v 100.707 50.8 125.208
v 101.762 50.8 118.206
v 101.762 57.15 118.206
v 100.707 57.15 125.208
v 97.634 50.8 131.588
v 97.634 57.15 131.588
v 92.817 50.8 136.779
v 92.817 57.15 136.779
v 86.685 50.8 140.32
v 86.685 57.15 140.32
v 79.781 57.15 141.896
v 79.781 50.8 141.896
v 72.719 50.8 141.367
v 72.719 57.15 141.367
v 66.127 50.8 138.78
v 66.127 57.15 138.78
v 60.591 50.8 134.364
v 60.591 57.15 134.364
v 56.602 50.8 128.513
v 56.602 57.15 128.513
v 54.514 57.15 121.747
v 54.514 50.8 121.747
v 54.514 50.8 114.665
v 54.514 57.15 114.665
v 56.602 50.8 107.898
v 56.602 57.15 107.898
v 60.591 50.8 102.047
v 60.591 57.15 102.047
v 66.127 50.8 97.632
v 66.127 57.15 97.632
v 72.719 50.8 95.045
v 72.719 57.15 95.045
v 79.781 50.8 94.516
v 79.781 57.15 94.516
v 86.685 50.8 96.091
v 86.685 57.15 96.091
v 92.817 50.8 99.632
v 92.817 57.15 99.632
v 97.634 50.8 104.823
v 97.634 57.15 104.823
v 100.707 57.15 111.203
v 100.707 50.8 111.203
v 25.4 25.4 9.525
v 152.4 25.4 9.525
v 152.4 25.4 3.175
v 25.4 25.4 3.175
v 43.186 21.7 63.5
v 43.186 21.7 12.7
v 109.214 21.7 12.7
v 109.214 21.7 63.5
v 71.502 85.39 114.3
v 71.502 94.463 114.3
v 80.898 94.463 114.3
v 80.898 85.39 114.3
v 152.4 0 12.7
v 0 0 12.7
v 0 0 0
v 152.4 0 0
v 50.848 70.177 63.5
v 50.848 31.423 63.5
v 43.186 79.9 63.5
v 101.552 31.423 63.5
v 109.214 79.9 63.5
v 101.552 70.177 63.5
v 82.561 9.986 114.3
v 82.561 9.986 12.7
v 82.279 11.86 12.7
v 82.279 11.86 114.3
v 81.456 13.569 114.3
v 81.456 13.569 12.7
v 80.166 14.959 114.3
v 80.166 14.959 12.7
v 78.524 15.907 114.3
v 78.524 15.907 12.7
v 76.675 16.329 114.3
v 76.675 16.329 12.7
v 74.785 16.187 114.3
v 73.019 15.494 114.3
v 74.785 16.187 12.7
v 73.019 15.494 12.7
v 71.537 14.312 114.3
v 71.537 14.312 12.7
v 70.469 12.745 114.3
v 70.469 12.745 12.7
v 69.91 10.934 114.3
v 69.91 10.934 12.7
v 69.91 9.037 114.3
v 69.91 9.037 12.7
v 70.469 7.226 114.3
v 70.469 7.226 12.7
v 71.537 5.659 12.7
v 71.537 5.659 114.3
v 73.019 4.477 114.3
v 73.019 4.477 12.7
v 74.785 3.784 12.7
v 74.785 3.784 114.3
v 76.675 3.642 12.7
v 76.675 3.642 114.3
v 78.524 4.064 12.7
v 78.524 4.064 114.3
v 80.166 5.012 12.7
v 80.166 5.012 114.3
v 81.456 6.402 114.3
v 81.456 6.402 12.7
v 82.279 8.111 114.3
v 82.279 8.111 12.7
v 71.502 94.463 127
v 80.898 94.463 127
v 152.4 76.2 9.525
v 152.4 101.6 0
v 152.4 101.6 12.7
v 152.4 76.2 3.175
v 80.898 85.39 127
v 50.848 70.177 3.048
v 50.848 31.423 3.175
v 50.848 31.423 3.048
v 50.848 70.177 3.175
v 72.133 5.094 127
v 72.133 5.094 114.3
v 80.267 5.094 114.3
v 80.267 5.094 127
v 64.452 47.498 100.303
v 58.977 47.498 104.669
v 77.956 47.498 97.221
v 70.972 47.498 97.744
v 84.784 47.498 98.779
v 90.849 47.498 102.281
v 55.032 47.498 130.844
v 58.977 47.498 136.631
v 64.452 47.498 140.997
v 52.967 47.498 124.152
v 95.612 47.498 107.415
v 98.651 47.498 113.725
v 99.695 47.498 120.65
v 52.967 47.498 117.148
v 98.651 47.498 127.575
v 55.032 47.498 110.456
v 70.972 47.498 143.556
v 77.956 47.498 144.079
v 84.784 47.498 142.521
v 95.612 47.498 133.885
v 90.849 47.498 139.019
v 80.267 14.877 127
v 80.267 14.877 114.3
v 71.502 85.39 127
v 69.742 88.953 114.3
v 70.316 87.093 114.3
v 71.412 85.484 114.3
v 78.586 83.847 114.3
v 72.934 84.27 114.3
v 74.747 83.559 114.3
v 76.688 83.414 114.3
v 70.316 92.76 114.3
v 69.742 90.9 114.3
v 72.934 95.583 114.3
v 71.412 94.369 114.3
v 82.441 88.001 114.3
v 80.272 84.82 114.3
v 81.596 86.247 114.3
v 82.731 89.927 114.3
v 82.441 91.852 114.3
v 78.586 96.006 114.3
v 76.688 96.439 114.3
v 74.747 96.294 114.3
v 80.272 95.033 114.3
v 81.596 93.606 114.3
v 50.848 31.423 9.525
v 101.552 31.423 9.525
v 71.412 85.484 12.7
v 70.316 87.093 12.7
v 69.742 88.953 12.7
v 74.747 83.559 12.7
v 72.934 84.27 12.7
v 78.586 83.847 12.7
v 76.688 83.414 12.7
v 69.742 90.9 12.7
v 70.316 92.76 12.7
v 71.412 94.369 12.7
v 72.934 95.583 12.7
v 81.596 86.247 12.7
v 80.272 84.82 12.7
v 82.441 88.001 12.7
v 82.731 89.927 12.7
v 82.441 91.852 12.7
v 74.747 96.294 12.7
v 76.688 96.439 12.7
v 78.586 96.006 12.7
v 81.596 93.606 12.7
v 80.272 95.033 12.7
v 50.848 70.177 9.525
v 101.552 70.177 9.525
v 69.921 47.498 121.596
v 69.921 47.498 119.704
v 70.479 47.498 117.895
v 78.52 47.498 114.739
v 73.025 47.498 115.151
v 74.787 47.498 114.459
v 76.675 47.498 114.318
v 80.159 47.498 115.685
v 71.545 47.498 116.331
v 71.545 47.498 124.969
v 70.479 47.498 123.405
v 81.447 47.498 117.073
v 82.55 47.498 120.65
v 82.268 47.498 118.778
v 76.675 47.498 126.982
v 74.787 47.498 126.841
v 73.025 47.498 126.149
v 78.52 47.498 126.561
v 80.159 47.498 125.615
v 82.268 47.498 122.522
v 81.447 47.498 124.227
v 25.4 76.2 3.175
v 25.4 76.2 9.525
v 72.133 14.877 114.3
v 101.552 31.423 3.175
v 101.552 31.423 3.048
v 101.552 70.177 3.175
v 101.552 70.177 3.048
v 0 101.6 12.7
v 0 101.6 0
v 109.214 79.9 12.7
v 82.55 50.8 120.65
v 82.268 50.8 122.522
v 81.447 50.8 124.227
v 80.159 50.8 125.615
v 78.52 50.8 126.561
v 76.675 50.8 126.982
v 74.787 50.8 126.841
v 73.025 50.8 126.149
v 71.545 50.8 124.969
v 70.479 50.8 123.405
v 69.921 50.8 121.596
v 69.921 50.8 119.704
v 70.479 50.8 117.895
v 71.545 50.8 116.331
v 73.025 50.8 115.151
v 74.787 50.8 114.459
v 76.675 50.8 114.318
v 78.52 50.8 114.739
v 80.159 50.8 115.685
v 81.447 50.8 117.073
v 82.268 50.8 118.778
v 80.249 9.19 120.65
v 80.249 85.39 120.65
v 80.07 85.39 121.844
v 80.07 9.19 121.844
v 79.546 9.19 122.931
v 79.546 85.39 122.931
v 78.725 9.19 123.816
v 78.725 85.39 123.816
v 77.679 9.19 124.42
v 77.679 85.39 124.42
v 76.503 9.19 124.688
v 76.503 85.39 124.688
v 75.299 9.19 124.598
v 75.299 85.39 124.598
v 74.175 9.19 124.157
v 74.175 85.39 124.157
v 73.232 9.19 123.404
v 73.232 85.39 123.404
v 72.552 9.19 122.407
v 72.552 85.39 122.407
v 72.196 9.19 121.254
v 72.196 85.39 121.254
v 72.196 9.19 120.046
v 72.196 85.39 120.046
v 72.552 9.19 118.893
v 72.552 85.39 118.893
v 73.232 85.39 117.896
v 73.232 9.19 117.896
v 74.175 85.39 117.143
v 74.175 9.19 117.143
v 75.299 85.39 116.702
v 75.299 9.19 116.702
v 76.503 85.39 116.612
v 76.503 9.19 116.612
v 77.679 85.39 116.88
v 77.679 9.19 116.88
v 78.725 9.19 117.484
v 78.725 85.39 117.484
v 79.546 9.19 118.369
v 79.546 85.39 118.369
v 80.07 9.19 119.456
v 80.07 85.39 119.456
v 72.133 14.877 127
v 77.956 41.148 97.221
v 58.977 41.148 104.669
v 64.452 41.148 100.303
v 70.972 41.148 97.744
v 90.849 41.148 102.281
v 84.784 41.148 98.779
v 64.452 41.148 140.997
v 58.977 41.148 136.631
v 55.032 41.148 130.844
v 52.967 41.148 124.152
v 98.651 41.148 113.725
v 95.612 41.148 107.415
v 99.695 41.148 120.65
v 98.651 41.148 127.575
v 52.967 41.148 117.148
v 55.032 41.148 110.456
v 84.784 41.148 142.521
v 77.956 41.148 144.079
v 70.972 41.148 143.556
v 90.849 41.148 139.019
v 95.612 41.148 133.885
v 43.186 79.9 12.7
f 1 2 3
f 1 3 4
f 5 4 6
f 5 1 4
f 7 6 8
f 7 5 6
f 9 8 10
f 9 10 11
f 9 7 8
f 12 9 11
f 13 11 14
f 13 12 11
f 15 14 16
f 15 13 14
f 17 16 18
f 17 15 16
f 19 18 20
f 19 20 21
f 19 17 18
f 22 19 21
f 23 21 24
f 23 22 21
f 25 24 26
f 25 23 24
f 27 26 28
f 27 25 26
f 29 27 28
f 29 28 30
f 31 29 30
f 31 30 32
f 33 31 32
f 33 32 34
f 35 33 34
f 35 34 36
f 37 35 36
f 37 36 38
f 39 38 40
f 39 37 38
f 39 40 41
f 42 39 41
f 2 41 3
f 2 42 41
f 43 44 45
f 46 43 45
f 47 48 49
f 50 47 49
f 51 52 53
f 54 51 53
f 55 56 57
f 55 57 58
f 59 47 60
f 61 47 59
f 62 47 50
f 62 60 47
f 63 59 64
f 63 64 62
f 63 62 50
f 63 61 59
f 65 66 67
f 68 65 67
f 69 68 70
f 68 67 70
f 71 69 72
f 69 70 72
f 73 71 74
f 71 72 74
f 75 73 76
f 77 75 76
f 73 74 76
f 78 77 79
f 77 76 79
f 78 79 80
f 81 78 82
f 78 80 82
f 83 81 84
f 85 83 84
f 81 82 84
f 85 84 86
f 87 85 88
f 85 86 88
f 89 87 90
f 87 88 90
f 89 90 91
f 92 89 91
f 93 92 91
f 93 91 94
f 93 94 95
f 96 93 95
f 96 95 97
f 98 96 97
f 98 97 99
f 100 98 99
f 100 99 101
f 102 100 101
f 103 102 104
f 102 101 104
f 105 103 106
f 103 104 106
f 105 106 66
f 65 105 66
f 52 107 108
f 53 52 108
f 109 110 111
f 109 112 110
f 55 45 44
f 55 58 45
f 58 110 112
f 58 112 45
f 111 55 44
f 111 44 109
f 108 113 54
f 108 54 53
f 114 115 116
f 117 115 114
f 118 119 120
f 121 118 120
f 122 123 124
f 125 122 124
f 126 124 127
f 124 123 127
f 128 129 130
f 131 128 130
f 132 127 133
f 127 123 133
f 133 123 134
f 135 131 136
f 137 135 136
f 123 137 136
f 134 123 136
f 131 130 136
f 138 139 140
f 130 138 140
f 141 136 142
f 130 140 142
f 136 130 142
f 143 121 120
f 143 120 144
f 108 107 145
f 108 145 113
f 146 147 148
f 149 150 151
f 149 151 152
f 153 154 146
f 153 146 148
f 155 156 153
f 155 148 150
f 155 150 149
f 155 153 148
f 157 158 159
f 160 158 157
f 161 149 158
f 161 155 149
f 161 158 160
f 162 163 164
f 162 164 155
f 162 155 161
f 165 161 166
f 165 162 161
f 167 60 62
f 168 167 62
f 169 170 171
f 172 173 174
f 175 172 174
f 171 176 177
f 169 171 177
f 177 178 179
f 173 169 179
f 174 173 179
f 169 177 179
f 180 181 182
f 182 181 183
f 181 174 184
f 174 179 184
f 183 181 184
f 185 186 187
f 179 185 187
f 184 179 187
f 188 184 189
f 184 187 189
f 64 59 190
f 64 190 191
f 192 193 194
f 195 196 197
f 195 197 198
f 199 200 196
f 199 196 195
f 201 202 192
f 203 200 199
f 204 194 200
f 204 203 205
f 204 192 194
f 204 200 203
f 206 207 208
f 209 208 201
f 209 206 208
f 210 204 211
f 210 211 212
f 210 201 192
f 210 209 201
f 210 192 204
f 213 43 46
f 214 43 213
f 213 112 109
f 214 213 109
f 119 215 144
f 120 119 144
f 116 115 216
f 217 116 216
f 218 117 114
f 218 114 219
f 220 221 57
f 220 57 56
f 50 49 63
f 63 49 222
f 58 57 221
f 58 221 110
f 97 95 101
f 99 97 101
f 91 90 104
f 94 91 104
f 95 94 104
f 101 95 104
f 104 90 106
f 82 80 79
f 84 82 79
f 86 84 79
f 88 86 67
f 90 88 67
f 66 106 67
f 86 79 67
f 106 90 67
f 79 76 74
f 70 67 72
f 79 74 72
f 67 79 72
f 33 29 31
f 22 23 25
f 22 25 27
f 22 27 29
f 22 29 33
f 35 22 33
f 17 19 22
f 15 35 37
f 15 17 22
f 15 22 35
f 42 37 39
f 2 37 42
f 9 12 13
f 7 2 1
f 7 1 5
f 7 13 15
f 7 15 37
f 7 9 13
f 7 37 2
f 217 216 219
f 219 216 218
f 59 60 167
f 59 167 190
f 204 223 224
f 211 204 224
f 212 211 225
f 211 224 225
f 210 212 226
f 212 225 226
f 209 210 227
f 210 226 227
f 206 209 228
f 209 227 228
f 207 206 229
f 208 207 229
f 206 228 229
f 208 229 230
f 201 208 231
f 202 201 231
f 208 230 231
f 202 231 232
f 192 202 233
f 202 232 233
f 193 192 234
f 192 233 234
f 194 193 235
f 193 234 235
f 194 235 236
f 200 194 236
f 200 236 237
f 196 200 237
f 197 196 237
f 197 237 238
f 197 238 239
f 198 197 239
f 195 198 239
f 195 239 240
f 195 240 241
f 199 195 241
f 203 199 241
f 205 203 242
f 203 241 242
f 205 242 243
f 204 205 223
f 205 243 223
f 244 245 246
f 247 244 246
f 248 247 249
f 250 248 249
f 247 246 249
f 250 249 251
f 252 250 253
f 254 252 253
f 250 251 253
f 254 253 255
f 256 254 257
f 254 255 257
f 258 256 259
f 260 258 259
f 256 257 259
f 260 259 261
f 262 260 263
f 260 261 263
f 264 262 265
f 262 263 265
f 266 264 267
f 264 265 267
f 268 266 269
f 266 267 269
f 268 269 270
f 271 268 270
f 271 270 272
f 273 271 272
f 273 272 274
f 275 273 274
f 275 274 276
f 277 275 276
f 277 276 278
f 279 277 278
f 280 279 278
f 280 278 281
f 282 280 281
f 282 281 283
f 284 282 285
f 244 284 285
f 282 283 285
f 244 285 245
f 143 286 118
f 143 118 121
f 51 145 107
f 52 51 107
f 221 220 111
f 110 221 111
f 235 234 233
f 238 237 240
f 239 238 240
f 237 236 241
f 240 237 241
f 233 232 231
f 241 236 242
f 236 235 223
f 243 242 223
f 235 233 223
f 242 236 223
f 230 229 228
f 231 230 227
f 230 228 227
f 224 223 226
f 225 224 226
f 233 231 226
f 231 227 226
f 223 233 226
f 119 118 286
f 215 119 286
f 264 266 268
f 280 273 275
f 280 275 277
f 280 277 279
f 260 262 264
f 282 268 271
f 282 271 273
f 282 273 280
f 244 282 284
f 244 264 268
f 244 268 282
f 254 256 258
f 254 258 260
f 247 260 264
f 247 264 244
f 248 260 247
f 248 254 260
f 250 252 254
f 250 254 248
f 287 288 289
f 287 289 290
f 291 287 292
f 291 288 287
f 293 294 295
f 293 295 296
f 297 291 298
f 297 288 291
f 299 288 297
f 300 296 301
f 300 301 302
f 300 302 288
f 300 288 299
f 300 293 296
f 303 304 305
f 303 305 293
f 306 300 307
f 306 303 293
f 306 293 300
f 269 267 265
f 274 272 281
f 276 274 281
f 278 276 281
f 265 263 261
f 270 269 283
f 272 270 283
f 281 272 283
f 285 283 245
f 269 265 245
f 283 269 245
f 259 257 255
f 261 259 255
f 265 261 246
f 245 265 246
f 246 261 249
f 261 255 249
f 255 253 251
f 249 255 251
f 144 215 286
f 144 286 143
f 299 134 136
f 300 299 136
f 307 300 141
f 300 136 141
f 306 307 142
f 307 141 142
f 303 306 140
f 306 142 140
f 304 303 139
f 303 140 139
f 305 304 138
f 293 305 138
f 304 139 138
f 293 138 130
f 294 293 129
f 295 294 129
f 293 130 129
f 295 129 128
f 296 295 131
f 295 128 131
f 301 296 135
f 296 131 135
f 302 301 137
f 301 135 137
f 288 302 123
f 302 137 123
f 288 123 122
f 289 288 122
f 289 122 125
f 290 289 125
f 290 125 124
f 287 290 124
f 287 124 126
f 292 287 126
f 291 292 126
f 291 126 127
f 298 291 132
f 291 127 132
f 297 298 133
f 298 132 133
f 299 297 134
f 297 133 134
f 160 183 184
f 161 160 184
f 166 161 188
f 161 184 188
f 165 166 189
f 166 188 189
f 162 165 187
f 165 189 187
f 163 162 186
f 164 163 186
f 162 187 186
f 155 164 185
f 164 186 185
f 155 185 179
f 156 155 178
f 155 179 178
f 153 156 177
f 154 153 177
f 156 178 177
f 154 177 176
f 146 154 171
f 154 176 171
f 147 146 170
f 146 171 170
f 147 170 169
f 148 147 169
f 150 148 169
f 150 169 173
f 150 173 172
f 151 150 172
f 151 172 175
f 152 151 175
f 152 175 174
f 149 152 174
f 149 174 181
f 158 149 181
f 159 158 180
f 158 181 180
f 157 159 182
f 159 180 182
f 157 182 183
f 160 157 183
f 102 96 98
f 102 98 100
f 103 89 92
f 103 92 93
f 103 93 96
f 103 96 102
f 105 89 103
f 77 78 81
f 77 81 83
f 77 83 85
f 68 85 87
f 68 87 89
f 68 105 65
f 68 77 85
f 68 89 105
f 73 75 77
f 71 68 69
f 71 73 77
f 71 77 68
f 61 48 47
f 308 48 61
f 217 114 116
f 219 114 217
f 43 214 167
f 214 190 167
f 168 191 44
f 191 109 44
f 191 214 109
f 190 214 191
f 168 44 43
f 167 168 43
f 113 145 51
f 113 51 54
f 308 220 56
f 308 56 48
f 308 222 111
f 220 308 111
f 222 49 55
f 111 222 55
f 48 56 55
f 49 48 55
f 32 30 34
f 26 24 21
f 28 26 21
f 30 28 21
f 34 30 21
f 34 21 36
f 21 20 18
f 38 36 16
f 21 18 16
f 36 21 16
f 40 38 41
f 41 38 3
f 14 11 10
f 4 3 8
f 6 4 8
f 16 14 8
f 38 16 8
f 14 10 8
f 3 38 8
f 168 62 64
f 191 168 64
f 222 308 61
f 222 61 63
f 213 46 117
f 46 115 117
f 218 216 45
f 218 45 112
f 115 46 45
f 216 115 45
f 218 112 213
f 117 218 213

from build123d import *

# Parameters (mm, degrees)
F0_W      = 152.4
F0_H      = 12.7
F1_DEPTH  = 101.6
F3_DEPTH  = 127
F4_W      = 66.0289544821
F4_H      = 58.2000215709
F5_DEPTH  = 50.8
F6_W      = 50.7049728394
F6_H      = 38.7546804905
F7_DEPTH  = 60.452
F8_R      = 6.3611309163
F9_DEPTH  = 101.6
F10_R     = 6.5311843642
F11_DEPTH = 101.6
F12_W     = 8.1331080545
F12_H     = 9.7830720897
F14_DEPTH = 12.7
F13_W     = 9.3966365277
F13_H     = 9.0735163396
F15_DEPTH = 12.7
F16_R     = 4.0494761519
F17_DEPTH = 76.2
F19_R     = 23.756550032
F20_DEPTH = 6.35
F21_R     = 6.35
F22_DEPTH = 3.302
F23_R     = 23.495
F24_DEPTH = 6.35


with BuildPart() as f1:
    # F0 (on Front) → F1 (new body)
    with BuildSketch(Plane.XZ):
        with Locations((76.2, 6.35)):
            Rectangle(F0_W, F0_H)
    extrude(amount=-F1_DEPTH)

    # F2 (on face) → F3 (cut)
    with BuildSketch(Plane.YZ.offset(152.4)):
        Polygon((76.2, 3.175), (76.2, 6.35), (76.2, 9.525), (25.4, 9.525), (25.4, 6.35), (25.4, 3.175), align=None)
    extrude(amount=-F3_DEPTH, mode=Mode.SUBTRACT)

    # F4 (on face) → F5 (join)
    with BuildSketch(Plane.XY.offset(12.7)):
        with Locations((76.2, 50.8)):
            Rectangle(F4_W, F4_H)
    extrude(amount=F5_DEPTH)

    # F6 (on face) → F7 (cut)
    with BuildSketch(Plane.XY.offset(63.5)):
        with Locations((76.2, 50.8)):
            Rectangle(F6_W, F6_H)
    extrude(amount=-F7_DEPTH, mode=Mode.SUBTRACT)


with BuildPart() as f9:
    # F8 (on face) → F9 (new body)
    with BuildSketch(Plane.XY.offset(12.7)):
        with Locations((76.2, 9.9855083972)):
            Circle(F8_R)
    extrude(amount=F9_DEPTH)


with BuildPart() as f11:
    # F10 (on face) → F11 (new body)
    with BuildSketch(Plane.XY.offset(12.7)):
        with Locations((76.2, 89.9265035987)):
            Circle(F10_R)
    extrude(amount=F11_DEPTH)


with BuildPart() as f14:
    # F12 (on face) → F14 (new body)
    with BuildSketch(Plane.XY.offset(114.3)):
        with Locations((76.2, 9.9855083972)):
            Rectangle(F12_W, F12_H)
    extrude(amount=F14_DEPTH)


with BuildPart() as f15:
    # F13 (on face) → F15 (new body)
    with BuildSketch(Plane.XY.offset(114.3)):
        with Locations((76.2, 89.9265035987)):
            Rectangle(F13_W, F13_H)
    extrude(amount=F15_DEPTH)


with BuildPart() as f17:
    # F16 (on face) → F17 (new body)
    with BuildSketch(Plane.XZ.offset(-85.3897454289)):
        with Locations((76.2, 120.65)):
            Circle(F16_R)
    extrude(amount=F17_DEPTH)


with BuildPart() as f20:
    # F19 (on offset) → F20 (new body)
    with BuildSketch(Plane.XZ.offset(-50.8)):
        with Locations((78.0054554343, 118.2057708502)):
            Circle(F19_R)
    extrude(amount=-F20_DEPTH)


with BuildPart() as f22:
    # F21 (on face) → F22 (new body)
    with BuildSketch(Plane.XZ.offset(-50.8)):
        with Locations((76.2, 120.65)):
            Circle(F21_R)
    extrude(amount=F22_DEPTH)


with BuildPart() as f24:
    # F23 (on face) → F24 (new body)
    with BuildSketch(Plane.XZ.offset(-47.498)):
        with Locations((76.2, 120.65)):
            Circle(F23_R)
    extrude(amount=F24_DEPTH)


solid = Compound([f1.part, f9.part, f11.part, f14.part, f15.part, f17.part, f20.part, f22.part, f24.part])
